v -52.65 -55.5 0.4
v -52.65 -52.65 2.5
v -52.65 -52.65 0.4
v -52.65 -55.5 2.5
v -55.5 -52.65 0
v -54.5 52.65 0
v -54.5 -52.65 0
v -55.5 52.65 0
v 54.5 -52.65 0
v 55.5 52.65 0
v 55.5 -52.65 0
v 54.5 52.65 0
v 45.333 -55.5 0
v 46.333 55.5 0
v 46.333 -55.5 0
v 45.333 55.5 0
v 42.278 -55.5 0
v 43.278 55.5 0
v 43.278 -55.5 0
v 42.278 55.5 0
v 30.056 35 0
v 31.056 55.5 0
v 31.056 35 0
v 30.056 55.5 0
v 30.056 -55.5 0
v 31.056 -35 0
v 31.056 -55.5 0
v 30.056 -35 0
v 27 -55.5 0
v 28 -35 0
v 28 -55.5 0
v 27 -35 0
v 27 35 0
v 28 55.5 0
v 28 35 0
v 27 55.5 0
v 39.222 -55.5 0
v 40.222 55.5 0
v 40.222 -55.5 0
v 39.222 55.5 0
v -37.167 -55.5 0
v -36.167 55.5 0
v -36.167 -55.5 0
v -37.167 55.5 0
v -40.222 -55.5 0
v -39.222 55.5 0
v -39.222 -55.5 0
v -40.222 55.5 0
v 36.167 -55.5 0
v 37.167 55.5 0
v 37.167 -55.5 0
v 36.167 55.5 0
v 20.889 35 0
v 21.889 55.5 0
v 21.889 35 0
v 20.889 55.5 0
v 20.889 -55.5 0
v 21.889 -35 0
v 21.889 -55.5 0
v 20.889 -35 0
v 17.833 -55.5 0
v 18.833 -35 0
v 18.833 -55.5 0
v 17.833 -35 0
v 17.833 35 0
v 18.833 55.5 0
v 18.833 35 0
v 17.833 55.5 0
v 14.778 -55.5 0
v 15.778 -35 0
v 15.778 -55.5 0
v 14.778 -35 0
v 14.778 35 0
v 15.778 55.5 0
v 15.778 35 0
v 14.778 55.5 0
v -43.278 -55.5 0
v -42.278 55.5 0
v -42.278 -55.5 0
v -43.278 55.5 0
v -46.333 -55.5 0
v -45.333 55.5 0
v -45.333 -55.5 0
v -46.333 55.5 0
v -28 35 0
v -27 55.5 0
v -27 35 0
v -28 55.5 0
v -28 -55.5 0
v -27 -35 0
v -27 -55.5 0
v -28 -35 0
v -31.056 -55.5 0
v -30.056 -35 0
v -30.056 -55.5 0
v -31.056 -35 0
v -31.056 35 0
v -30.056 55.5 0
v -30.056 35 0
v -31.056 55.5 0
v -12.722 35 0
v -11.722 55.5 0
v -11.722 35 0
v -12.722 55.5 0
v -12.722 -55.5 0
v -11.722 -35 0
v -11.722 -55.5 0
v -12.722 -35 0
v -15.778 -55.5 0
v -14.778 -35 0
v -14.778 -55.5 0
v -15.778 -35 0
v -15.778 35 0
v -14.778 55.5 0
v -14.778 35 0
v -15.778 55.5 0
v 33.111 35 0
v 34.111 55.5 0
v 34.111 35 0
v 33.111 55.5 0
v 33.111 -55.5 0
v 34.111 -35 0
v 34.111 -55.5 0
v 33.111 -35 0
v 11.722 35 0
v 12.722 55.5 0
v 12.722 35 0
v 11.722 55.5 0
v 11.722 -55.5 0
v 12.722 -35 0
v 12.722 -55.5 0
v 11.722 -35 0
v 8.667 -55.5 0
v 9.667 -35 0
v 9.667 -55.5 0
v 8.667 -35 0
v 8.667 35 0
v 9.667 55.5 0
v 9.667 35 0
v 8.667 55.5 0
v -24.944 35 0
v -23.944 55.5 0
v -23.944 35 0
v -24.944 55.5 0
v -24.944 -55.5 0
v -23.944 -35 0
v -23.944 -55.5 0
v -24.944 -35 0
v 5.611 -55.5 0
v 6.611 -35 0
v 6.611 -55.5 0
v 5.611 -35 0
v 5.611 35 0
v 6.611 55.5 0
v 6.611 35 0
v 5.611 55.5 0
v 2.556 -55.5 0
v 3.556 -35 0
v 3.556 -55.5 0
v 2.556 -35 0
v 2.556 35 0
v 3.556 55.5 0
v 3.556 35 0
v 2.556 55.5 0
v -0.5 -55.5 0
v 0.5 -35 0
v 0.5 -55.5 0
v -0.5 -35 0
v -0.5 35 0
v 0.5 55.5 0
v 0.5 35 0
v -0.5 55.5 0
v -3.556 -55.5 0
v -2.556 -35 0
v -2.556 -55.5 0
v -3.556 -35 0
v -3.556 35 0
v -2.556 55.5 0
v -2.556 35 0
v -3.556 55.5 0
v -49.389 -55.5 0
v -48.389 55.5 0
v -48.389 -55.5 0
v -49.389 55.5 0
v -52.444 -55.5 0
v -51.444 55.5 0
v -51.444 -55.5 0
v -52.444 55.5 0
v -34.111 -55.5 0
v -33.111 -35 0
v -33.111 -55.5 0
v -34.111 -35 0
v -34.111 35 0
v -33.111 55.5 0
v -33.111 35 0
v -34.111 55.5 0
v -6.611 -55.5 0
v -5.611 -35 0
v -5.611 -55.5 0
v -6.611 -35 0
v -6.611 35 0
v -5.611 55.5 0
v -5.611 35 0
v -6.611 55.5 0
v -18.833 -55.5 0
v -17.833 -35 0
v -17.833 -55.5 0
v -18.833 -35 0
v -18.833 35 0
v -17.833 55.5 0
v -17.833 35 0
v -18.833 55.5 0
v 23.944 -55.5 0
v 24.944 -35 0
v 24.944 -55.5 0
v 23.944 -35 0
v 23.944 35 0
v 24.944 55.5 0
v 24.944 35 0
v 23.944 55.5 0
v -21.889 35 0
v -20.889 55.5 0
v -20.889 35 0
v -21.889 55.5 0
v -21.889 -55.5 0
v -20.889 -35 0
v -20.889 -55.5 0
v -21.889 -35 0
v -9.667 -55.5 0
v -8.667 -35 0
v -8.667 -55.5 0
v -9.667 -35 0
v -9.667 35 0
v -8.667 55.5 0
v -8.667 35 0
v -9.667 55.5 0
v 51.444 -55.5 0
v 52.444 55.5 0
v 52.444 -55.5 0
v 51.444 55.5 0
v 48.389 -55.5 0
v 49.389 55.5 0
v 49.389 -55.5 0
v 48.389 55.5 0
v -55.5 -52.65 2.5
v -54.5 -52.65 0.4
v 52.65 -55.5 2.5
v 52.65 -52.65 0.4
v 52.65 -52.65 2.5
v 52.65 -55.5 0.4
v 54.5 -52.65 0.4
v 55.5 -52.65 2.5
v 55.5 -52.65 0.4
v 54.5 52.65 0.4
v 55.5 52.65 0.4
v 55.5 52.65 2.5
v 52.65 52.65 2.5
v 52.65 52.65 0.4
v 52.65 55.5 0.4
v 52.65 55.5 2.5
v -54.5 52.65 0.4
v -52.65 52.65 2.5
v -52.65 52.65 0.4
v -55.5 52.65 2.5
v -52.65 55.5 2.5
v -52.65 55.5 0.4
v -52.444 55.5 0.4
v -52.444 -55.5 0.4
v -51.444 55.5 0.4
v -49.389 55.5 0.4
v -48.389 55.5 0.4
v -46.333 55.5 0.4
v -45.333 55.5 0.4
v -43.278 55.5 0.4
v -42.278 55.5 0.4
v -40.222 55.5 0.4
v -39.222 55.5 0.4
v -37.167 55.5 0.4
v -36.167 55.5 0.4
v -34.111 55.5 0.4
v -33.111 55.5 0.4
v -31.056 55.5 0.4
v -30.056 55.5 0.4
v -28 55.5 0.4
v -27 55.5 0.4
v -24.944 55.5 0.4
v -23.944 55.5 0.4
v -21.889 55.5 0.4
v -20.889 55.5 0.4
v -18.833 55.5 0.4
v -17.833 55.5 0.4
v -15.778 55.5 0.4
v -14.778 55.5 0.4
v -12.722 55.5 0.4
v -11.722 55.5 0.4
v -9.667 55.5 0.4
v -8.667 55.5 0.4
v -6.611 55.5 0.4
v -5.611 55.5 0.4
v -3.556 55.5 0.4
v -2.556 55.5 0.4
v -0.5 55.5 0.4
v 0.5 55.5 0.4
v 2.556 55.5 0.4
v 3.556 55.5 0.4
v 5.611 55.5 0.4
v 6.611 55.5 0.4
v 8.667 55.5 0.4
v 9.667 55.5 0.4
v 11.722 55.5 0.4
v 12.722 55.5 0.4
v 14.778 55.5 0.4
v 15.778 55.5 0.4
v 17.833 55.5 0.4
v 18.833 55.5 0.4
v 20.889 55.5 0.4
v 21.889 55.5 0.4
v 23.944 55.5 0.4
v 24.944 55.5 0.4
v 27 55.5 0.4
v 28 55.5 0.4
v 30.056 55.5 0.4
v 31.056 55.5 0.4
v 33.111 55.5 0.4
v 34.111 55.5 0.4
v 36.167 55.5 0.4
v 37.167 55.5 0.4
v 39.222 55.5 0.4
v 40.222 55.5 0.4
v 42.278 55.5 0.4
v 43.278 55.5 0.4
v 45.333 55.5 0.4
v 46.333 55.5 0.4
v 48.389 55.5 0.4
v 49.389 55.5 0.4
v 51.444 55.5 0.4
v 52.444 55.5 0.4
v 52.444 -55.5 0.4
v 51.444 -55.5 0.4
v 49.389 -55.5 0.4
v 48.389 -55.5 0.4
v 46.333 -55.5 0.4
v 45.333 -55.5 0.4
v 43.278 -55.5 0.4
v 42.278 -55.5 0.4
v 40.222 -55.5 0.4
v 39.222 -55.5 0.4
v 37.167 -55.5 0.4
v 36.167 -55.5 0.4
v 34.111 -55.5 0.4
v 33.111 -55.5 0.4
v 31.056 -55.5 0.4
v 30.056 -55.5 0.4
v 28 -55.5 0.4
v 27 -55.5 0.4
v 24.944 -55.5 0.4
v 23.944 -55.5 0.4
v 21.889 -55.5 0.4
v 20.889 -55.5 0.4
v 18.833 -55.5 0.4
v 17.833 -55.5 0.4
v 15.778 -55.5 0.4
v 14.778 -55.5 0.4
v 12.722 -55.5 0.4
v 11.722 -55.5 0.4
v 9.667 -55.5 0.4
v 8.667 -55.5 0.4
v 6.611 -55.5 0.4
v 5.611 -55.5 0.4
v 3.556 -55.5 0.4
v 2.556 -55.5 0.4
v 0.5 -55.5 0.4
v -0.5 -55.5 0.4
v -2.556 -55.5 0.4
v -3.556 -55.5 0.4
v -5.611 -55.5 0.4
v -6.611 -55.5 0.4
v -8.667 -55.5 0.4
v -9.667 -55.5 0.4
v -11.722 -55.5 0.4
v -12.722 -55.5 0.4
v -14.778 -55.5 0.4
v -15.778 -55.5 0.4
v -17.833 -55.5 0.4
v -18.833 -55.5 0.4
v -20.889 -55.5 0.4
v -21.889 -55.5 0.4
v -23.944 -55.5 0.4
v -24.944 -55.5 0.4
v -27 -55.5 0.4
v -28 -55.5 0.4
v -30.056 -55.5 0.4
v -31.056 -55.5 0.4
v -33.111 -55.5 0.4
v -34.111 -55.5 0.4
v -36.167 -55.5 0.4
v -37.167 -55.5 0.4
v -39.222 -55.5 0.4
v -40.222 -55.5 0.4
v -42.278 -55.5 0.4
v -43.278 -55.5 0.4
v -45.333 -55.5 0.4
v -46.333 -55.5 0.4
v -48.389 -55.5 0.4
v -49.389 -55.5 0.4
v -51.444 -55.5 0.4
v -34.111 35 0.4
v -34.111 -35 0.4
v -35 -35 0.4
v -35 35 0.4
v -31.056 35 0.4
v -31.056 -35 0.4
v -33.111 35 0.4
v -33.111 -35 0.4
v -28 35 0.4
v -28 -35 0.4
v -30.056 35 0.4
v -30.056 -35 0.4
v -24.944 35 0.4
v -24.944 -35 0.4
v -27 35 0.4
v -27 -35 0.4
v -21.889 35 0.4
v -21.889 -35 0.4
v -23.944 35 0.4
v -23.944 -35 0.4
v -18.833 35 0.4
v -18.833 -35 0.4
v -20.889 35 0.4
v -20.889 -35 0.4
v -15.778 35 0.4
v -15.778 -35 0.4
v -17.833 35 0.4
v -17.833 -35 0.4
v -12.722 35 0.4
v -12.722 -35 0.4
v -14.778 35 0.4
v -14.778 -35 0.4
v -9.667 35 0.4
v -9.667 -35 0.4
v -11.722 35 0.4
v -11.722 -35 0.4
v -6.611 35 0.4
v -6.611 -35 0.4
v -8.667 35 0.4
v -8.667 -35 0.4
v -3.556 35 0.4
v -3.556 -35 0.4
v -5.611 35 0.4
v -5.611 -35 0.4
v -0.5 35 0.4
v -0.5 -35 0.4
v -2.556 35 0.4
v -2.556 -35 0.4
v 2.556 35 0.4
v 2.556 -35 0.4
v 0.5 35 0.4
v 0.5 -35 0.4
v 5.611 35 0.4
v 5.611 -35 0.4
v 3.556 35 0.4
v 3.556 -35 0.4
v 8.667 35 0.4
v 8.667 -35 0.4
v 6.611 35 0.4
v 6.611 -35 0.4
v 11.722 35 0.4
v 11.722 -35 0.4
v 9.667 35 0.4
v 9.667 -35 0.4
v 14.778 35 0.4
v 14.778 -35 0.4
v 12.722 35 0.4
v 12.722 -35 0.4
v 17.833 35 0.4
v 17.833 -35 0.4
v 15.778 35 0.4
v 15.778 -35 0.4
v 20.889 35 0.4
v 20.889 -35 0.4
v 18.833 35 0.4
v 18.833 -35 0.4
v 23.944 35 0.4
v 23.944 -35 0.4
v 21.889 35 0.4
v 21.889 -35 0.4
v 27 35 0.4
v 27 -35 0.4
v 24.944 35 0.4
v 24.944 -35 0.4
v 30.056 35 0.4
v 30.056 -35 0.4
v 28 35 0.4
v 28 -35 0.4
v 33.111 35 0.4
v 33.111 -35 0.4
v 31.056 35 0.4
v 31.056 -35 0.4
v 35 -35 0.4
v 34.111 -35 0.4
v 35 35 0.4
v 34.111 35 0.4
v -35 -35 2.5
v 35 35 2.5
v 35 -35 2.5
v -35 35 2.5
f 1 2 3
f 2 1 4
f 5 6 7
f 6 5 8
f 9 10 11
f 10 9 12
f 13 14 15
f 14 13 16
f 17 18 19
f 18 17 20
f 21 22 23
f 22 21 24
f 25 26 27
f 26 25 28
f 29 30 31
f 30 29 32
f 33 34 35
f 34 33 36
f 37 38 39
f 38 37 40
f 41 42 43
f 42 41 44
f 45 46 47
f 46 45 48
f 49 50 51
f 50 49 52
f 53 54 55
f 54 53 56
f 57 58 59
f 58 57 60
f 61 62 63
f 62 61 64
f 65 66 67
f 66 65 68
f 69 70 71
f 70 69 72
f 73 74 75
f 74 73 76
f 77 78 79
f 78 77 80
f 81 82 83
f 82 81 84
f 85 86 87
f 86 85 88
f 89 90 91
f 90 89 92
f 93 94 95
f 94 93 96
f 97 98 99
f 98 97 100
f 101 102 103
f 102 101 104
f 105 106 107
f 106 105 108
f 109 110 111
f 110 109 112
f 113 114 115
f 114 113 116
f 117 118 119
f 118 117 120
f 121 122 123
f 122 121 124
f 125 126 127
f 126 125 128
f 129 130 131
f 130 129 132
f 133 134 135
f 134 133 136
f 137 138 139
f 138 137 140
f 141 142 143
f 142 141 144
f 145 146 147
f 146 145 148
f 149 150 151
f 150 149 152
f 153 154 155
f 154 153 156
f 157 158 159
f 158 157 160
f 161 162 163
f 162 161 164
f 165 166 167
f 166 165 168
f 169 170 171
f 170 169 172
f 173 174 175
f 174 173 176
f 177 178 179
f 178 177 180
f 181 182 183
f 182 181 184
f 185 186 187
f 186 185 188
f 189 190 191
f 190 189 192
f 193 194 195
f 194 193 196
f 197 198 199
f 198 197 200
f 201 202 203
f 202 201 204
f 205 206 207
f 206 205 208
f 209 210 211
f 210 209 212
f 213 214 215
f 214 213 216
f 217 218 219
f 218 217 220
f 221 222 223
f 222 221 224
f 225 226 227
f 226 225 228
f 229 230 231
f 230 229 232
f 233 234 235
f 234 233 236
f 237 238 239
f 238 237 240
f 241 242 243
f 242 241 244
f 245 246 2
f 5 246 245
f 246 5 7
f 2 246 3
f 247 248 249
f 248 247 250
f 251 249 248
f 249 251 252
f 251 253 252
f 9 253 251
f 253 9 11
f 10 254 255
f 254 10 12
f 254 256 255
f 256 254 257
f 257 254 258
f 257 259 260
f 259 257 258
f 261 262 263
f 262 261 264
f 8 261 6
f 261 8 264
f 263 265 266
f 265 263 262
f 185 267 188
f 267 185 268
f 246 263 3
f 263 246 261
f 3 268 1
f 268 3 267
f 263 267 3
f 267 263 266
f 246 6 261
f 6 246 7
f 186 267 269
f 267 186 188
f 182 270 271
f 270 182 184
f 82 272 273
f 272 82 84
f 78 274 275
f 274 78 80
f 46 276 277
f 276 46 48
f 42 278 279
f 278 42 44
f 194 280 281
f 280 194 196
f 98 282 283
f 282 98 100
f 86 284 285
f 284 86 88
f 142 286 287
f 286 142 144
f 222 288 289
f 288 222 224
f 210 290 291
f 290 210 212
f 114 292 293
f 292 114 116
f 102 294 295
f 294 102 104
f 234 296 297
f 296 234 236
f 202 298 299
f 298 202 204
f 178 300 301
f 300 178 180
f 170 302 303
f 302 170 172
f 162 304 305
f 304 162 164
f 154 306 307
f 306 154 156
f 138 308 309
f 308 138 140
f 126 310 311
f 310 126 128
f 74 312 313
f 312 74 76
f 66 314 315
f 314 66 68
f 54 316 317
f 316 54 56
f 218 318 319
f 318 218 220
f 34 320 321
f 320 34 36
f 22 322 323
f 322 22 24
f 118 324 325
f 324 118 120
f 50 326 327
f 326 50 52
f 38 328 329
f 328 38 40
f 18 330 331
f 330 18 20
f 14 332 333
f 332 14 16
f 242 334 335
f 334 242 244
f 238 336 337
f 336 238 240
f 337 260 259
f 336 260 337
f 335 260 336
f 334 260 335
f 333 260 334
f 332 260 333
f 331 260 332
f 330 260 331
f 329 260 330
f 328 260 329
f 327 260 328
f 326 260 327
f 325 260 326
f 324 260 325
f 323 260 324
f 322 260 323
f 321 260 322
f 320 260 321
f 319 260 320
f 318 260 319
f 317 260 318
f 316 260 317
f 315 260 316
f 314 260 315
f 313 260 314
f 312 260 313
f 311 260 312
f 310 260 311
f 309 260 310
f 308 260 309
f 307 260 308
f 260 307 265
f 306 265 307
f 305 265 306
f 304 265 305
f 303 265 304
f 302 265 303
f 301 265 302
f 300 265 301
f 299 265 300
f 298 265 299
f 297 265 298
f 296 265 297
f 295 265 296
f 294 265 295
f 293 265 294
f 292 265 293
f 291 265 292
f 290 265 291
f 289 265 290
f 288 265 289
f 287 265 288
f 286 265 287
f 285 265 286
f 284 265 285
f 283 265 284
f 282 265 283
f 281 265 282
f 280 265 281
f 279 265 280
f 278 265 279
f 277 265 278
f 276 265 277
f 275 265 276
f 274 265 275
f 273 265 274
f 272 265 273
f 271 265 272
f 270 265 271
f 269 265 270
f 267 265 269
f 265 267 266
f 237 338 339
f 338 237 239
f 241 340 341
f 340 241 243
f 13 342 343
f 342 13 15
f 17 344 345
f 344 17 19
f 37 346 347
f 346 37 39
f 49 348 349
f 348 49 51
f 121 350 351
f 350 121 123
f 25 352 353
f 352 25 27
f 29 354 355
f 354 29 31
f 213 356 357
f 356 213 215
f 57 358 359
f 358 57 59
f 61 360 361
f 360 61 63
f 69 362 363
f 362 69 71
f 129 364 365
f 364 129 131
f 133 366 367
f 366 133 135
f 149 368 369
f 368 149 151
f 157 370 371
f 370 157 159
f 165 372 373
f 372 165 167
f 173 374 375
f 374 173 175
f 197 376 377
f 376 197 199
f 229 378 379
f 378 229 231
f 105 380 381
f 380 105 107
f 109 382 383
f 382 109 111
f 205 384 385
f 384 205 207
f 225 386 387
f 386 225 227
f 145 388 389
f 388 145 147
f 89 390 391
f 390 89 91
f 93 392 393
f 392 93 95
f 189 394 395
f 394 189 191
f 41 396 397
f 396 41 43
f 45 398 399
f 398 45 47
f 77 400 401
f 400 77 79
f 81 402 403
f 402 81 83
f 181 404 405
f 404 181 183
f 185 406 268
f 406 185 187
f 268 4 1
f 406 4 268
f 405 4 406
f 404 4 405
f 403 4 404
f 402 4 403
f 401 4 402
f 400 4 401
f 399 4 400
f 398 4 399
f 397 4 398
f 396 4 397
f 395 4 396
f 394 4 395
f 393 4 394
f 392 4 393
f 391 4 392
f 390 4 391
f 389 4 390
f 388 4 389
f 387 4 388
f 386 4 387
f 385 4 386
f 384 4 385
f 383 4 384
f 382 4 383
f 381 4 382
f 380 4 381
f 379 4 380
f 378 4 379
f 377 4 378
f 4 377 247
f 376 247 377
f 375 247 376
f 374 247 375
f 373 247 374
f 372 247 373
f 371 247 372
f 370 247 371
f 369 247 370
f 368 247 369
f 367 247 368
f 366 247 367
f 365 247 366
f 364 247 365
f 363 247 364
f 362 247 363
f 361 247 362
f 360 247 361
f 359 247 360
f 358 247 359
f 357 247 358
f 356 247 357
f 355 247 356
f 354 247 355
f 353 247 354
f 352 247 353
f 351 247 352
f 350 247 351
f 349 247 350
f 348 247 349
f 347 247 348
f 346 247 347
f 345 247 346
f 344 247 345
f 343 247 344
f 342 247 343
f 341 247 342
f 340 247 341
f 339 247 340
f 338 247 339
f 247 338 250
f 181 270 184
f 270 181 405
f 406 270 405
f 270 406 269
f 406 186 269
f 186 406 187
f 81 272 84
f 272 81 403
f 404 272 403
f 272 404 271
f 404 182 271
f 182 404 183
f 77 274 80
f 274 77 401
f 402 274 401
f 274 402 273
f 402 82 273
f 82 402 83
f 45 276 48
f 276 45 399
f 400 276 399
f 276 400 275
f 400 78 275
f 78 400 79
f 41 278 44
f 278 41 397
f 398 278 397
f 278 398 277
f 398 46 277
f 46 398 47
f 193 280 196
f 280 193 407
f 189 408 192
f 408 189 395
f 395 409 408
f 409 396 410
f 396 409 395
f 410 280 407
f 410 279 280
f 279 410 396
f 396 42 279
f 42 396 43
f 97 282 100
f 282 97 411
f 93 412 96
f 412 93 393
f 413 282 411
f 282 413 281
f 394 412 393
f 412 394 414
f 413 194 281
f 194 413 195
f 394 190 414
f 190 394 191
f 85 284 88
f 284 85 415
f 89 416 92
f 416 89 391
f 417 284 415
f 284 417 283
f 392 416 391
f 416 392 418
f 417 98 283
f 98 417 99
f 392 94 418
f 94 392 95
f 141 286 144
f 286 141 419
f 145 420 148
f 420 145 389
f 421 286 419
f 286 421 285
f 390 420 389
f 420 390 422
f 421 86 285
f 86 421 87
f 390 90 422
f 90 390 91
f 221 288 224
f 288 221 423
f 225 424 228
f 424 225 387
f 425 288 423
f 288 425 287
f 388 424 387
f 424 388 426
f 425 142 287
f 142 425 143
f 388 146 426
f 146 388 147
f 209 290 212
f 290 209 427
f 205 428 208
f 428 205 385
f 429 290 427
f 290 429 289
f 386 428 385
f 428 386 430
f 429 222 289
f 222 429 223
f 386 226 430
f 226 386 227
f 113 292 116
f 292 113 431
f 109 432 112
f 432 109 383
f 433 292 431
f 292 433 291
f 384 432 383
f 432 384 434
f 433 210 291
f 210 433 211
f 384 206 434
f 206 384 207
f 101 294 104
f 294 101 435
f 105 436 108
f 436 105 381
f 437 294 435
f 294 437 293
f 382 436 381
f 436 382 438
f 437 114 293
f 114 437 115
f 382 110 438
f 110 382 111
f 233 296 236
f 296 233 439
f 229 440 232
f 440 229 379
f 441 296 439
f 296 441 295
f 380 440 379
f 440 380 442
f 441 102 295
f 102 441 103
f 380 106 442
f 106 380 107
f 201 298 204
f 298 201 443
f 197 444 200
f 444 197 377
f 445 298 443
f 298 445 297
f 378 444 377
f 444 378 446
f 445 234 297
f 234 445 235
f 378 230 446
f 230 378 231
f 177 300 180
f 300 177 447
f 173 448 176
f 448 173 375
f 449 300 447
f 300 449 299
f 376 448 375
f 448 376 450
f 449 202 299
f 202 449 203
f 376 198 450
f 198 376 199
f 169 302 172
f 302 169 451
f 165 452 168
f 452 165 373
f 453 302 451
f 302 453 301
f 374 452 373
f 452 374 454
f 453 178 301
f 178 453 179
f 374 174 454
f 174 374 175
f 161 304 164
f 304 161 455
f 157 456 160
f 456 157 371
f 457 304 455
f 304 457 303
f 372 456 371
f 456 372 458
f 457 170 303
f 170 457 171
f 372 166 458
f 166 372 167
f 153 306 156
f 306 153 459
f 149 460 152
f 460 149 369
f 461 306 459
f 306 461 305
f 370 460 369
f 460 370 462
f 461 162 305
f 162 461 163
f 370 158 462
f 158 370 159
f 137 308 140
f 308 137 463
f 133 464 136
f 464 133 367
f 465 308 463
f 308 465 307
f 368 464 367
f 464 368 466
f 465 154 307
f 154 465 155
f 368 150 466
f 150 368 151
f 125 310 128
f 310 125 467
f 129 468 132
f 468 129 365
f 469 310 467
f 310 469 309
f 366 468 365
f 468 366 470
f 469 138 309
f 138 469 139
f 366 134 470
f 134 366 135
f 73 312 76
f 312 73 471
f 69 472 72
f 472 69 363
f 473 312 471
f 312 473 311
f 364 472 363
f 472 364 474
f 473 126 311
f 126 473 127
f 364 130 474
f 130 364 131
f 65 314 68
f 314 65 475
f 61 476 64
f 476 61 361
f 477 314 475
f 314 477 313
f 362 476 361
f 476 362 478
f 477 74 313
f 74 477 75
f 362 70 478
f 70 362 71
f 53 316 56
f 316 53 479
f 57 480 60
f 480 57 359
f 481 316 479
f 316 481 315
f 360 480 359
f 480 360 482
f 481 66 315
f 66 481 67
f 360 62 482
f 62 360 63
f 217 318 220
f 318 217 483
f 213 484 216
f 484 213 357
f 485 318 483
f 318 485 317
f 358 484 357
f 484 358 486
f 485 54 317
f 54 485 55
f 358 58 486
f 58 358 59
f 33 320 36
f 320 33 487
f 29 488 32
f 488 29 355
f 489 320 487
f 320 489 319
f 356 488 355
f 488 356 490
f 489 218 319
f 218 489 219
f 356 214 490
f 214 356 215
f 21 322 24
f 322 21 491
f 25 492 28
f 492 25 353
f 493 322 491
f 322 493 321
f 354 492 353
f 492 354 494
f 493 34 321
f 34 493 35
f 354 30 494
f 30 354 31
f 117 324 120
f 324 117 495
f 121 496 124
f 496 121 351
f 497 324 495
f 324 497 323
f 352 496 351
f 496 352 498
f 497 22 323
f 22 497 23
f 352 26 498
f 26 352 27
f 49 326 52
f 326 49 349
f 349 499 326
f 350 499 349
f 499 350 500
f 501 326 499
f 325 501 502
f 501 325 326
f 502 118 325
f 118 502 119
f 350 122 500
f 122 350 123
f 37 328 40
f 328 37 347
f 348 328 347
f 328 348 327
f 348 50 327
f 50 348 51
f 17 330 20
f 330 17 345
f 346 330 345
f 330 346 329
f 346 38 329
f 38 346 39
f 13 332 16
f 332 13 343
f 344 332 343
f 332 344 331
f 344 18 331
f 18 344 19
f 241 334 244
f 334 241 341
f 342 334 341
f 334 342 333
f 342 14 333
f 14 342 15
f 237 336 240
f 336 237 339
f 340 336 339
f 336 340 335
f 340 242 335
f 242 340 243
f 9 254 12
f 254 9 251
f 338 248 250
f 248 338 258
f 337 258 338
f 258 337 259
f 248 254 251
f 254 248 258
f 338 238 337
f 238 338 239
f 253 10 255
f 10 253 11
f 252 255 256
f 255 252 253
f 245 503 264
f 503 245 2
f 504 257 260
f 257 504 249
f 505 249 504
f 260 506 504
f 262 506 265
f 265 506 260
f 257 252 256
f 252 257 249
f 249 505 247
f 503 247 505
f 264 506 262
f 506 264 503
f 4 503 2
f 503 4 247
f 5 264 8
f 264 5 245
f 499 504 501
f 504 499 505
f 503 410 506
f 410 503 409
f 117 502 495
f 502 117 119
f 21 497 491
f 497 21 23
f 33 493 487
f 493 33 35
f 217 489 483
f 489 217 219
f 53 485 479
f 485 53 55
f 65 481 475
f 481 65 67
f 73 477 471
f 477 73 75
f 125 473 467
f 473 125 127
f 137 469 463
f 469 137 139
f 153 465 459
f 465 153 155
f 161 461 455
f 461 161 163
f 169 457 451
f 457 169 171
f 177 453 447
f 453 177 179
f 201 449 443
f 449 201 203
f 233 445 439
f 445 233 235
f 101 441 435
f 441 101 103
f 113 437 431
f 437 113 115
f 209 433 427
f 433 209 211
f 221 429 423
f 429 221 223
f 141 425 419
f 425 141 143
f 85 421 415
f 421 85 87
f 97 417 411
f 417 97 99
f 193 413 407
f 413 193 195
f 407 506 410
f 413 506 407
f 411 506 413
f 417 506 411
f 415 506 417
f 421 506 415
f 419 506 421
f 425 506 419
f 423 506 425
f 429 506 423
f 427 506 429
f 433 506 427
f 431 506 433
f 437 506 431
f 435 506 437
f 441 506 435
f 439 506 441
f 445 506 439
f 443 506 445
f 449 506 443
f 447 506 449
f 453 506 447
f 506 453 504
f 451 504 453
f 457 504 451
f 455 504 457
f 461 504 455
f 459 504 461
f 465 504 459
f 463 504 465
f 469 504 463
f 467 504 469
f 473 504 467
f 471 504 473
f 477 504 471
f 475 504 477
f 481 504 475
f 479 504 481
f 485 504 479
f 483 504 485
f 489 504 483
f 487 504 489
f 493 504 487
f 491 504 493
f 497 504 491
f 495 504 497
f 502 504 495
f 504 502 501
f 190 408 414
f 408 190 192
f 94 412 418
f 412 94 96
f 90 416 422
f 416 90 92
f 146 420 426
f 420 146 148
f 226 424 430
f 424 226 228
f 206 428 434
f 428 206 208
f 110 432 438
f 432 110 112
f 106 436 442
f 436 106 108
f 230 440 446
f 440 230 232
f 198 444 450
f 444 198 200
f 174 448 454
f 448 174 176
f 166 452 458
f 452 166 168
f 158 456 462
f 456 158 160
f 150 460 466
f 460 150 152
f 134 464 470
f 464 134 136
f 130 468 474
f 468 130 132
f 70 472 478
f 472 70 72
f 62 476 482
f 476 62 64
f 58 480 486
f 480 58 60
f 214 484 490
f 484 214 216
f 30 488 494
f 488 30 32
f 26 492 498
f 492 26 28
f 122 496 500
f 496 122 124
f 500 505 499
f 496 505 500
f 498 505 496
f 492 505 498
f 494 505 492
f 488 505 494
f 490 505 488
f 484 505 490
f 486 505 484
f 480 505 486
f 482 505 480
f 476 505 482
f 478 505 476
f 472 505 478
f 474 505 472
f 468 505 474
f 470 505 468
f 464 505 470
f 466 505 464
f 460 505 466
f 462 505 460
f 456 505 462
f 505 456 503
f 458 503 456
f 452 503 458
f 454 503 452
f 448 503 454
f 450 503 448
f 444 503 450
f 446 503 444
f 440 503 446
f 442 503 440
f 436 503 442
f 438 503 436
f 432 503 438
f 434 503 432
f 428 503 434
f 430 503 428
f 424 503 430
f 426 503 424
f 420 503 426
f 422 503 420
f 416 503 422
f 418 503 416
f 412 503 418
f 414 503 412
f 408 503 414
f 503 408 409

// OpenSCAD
// file: global_vars.scad
// Z axis is optical axis.

tol = 0.2;
fn=100;
wall_thickness = 2.5;

camHolder_squareSide = 42.2;
camHolder_tall = 7.5;

plateHolder_tall = 5.0;
plateHolder_R_tol = 1.0;
plateHolder_Rthick = 1.5;
plateHolder_lip = 1.5;

lightBox_side = 111.0;
light_height = 25.0;
lightBox_shellThick = wall_thickness;
lightBox_cutthrough = 70.0;
lightFilter_thick = 10.0;
lightFilter_side = lightBox_cutthrough+5.0;
lightBox_height = light_height+lightFilter_thick+lightBox_shellThick;
lightBox_cordHoleD = 15.0;
lightBox_cordHole_edgeOffset = 20.0;

mast_offset = (lightFilter_side/2)+wall_thickness;
mast_length = 10.0;
mast_width = 5.0;
mast_tall = 150;

mastGrips_thick = 5.0;
mastGrips_tall = 10.0;

piCamB2_side = 32.35;
piCamB2_tall = 2.0;
piCamB2_ledge = 5.0;
piCamB2cable_wide = 17.0;
piCamB2cable_deep = 11.0;



ribDeep = 0.4;
ribThick=1;
ribSpace=2;

piPeg_len = 10.0;
piPeg_OR = 3.0;
piPeg_IR = 1.4;
pi_len = 49.0;
pi_wid = 58.0;
piholder_thick = wall_thickness;
piholder_tall = 85.0;
piholder_fin_wide = 36.0;


module tripleMastGrip(mast_length=mast_length, mast_width=mast_width, mastGrips_thick=mastGrips_thick, arm_tall=plateHolder_tall, mastGrips_tall=mastGrips_tall, mast_offset=mast_offset, tol=tol, arms=true){
    mastGrip(mast_length, mast_width, mastGrips_thick, arm_tall, mastGrips_tall, mast_offset, tol, 0, arms);
    mastGrip(mast_length, mast_width, mastGrips_thick, arm_tall, mastGrips_tall, mast_offset, tol, 90, arms);
    mastGrip(mast_length, mast_width, mastGrips_thick, arm_tall, mastGrips_tall, mast_offset, tol, -90, arms);
}

module regularRibs(x=1, y=1, ribDeep=ribDeep, ribThick=ribThick, ribSpace=ribSpace){
    adjusted_space =(x-ribThick)/floor((x-ribThick)/(ribSpace+ribThick))-ribThick;
    for (p = [ribThick:adjusted_space+ribThick:x]){
        translate([p,0,0]){
            cube([adjusted_space, y, ribDeep]);
        }
    }
}

module XYcenteredCube(x=0,y=0,z=0){
    translate([-x/2,-y/2,0]){
        cube([x,y,z]);
    }  
}

module XYcenteredRoundedCube(x=0,y=0,z=0,r=1,fn=fn){
    translate([-x/2,-y/2,0]){
        roundedCube(x,y,z,r,fn);
    }  
}


module XYcenteredCylinder(d=0,z=0){
    translate([-d/2,-d/2,0]){
        cylinder(d=d,z);
    }  
}

module mastGrip(m_len, m_wid, g_thik, g_tall, gm_tall, off, tol, rot, arm=true){
    grip_len = m_len+(2*(g_thik));
    grip_wid = m_wid+g_thik;
    r=wall_thickness;
    rotate([0,0,rot]){
        difference(){
            union(){
                r = min(wall_thickness, mastGrips_thick);
                //main arm
                if(arm){
                    translate([-grip_len/2, 0, 0]){
                        roundedCube(grip_len, off+grip_wid, g_tall, r, fn);
                    }
                }
                //grip
                translate([-grip_len/2, off-g_thik, 0]){
                    roundedCube(grip_len, m_wid+(g_thik*2), gm_tall, r, fn);
                }
            }
            //cut
            translate([-(m_len+tol)/2, off-(tol/2),0]){
                outflangedCube(m_len+tol, m_wid+tol, gm_tall, r/1.5, fn);
            }
        }
    }
}

module tripleMastHoleToCut(m_len=mast_length, m_wid=mast_width, gm_tall=mastGrips_tall, off=mast_offset, tol=tol, yRot=180, r=wall_thickness){
    for(rot=[-90,0,90]){
        rotate([0,yRot,rot]){
            translate([-(m_len+tol)/2, off+tol, -tol/2]){
                
                outflangedCube(m_len+tol, m_wid+tol, gm_tall+tol, r=r, fn=fn);
            }
        }
    }
}

module lightBoxPegs(s=lightBox_shellThick, p=lightBox_side, up=1){
    for(rot=[0, 90, 180, 270]){
        rotate([0, 0, rot]){
            translate([-p/2, -p/2, -s*up]){
                cube([s, s, s]);
            }
        }
    }
}

module roundedCube(l, w, h, r, fn=fn){
    hull(){
        for(x=[0+r,l-r], y=[0+r,w-r], z=[0+r,h-r]){
            translate([x, y, z]){
                sphere(r=r, $fn=fn);
            }
        }
    }
}

module fourCylinderCube(l, w, h, r, fn=fn){
    hull(){
        for(x=[0+r,l-r], y=[0+r,w-r], z=0){
            translate([x, y, z]){
                cylinder(h=h, r=r, $fn=fn);
            }
        }
    }
}

module outflangedCube(l, w, h, r, fn){
    union(){
                    color("blue")
        cube([l,w,h]);
                    color("red")
        hull(){
            for(x=[0,l], y=[0,w]){
                translate([x,y,0]){
                    cylinder(h=r, r1=r, r2=0, $fn=fn);
                }
            }
        }
    }
}

module square_with_pulled_out_corners(side, h, r, fn=fn){
    _side = sqrt(2)*(side/2+r);
    difference(){
        XYcenteredCube(_side/sqrt(2),_side/sqrt(2),h);
        rotate([0,0,45]){
            for(x=[-_side/2,_side/2], y=[-_side/2,_side/2], z=0){
                translate([x, y, z]){
                    very_fine_cylinder(h=h, r=r,f=1, $fn=fn);
                }
            }
        }        
    }
}            
            

module very_fine_cylinder(h, r, f, fn=100){
    c = PI*2*r;
    n = ceil((c/fn)/f);
    a = (360/fn)/n;
    hull(){
        for(i=[0:a:(360/fn)-a]){
           rotate([0,0,i])
           cylinder(h=h, r=r, $fn=fn);  
        }
    }
}    


            
            
            
            
            
            
            
            
            
            
            
            
            
            
            
            
            
            
// main file
include <global_vars.scad>;


difference(){
    XYcenteredCube(lightBox_side, lightBox_side, lightBox_shellThick);
    lightBoxPegs(s=lightBox_shellThick+tol*2, p=lightBox_side+tol/2, up=0);
    //ribs
    translate([-lightBox_side/2, -lightBox_side/2,0]){
        regularRibs(lightBox_side, lightBox_side);
    }
    //window
    XYcenteredCube(lightBox_cutthrough, lightBox_cutthrough, lightBox_height);
}
